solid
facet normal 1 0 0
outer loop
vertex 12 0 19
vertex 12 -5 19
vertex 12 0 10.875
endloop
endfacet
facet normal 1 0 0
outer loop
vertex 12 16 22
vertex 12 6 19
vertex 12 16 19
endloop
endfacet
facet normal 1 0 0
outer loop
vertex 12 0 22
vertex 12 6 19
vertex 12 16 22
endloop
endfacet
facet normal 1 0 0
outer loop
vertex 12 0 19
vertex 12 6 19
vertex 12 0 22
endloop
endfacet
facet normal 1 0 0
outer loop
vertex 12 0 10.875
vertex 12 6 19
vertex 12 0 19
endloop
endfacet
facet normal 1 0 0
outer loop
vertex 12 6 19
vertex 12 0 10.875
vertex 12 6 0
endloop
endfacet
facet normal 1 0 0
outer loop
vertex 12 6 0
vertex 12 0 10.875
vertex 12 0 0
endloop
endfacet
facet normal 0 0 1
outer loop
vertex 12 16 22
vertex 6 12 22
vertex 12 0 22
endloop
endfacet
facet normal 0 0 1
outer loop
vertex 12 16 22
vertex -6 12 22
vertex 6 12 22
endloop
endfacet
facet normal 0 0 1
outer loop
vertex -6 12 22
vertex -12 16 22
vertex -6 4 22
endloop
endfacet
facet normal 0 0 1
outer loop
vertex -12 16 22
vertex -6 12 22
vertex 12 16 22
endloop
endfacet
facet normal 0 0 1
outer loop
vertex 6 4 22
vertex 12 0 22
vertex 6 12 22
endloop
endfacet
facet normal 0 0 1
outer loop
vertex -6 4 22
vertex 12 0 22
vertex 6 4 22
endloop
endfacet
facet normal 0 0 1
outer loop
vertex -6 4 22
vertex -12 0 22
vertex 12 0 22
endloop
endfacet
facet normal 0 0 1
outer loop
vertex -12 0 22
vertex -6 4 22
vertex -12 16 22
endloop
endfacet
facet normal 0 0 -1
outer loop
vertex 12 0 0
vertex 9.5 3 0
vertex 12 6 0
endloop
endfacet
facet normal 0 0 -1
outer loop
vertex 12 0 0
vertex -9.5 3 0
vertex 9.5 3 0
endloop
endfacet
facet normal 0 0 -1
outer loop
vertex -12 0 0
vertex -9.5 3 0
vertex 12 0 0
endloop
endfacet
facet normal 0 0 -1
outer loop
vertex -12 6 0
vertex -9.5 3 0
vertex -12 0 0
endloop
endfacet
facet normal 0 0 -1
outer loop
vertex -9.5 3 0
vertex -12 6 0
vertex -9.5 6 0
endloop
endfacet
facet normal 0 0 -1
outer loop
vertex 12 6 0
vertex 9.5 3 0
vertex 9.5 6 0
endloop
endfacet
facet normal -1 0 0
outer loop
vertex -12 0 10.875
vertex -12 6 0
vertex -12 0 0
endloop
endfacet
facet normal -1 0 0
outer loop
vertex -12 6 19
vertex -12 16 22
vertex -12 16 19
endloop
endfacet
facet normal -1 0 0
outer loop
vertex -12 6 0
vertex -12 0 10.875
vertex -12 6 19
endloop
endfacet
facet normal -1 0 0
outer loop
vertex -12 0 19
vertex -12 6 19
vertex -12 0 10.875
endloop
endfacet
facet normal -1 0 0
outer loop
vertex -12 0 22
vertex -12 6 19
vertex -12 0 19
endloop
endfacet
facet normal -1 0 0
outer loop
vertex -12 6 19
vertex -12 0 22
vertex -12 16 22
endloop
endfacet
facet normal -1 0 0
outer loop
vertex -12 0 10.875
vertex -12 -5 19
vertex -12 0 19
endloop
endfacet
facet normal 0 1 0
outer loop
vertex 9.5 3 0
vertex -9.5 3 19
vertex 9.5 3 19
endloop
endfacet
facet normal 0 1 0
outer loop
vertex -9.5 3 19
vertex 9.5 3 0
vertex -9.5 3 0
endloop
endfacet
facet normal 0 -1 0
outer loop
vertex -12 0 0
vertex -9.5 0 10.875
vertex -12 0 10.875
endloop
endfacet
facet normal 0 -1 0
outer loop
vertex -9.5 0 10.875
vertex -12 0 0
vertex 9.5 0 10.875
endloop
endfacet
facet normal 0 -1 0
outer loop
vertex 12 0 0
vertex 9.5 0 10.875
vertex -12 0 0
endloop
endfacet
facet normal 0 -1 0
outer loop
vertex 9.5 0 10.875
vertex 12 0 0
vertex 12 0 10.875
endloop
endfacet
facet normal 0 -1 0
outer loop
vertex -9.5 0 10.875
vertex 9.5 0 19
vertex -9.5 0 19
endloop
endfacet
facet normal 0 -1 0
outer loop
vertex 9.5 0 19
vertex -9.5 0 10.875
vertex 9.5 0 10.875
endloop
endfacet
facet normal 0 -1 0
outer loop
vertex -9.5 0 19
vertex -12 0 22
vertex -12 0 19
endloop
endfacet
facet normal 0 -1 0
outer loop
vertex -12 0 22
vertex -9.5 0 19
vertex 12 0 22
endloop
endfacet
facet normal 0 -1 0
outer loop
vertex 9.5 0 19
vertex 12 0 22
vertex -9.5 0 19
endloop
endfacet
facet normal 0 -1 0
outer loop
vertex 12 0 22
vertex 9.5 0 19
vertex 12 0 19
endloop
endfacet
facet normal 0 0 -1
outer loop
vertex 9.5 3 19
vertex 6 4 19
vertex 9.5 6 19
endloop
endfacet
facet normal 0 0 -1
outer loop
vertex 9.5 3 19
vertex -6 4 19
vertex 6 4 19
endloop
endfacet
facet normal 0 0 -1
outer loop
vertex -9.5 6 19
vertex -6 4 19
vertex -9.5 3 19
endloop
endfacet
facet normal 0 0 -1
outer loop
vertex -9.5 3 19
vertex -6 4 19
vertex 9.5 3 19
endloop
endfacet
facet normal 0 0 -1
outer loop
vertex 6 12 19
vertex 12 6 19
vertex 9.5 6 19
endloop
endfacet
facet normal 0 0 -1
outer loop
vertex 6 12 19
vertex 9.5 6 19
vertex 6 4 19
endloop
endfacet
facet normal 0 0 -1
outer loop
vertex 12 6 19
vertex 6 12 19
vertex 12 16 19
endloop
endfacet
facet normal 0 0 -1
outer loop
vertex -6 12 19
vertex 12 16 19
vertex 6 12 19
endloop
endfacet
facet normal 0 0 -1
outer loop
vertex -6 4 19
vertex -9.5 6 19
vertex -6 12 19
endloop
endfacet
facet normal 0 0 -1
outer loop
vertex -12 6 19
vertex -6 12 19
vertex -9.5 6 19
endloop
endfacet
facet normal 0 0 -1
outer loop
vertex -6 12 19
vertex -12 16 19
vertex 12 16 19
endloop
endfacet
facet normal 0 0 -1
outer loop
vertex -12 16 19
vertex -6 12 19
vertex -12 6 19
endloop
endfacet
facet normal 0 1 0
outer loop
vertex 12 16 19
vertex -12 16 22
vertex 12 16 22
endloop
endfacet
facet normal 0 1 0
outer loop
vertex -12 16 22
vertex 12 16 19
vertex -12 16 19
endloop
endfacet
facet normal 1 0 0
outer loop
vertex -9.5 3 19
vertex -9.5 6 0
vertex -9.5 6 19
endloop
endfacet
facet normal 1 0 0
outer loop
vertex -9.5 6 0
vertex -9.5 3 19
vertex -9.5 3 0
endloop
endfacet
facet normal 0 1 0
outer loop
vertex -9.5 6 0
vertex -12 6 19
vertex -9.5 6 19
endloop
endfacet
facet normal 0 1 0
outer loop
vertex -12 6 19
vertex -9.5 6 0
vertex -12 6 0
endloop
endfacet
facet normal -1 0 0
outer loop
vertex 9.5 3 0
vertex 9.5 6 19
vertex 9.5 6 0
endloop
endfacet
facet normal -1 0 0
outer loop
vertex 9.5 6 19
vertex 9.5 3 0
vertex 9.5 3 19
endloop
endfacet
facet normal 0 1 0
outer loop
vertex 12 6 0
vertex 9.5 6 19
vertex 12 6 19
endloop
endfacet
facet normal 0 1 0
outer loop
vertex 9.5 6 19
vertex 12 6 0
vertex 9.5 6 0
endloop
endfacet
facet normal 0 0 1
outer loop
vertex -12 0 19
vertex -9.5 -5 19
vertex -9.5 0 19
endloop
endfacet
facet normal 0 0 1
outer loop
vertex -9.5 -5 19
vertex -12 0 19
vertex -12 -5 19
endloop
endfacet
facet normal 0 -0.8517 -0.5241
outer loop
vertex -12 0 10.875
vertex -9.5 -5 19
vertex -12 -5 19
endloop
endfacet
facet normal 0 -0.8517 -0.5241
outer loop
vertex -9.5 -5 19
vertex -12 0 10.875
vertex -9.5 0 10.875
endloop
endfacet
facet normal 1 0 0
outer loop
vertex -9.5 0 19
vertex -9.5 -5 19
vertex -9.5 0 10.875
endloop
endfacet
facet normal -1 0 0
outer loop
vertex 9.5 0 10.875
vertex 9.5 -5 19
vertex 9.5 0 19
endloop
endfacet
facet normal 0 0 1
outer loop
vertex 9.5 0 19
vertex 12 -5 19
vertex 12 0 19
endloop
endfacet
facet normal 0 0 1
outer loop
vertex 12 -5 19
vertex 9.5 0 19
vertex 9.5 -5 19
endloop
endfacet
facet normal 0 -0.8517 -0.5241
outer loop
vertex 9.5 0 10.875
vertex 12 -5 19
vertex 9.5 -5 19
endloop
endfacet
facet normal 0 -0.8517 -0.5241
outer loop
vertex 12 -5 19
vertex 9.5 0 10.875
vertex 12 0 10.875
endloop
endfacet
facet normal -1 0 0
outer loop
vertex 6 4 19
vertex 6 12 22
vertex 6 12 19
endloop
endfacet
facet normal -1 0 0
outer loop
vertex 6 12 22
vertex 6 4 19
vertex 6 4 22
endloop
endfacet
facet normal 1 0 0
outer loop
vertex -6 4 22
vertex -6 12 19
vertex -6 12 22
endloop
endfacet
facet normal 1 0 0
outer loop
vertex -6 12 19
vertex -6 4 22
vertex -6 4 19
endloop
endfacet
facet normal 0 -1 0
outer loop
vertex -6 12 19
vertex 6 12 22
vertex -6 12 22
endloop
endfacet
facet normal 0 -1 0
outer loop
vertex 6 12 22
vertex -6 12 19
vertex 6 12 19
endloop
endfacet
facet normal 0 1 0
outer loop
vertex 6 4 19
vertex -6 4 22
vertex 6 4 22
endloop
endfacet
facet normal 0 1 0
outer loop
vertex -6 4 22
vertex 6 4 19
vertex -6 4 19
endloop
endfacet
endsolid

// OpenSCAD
// USB-C base bracket for V_2_Daniel_Weber_Stand
// Holds a panel-mount USB-C female jack in the open bottom-center of the stand.
// Edit the numbers, then render (F6) and export STL.  Identical defaults to
// tools/make_base_bracket.py -- use whichever you prefer.
//
// Orientation when installed: +Z points to the REAR (the jack faces out the open
// back of the base); the FRONT face (Z=0) butts the solid front bezel so plugging
// a cable in can't push the bracket inward. Print with the FLOOR on the bed.

/* ---- tune to YOUR jack (mm) ---- */
pocket_depth = 22.0;  // front-to-back; keep == stand pocket depth so it wedges
width        = 24.0;
height       = 16.0;
floor_t      = 3.0;
panel_t      = 3.0;

aper_w   = 12.0;      // jack aperture width  (jack body + ~0.5 mm)
aper_h   = 8.0;       // jack aperture height
aper_yc  = 8.0;       // aperture center above the floor

screw_holes   = false; // set true if your jack mounts with 2 screws
screw_spacing = 16.0;  // center-to-center
screw_dia     = 2.2;   // M2 clearance

rail_t = 2.5; rail_h = 6.0;      // side rails
gusset_l = 8.0; gusset_h = 13.0; // panel-to-floor braces
$fn = 32;

module gusset(cx)
  // right-triangle brace on the panel front face, spanning rail width at x=cx
  translate([cx - rail_t/2, floor_t, pocket_depth - panel_t])
    rotate([0,90,0])
      linear_extrude(rail_t)
        polygon([[0,0],[0,-gusset_l],[gusset_h,0]]);

difference() {
  union() {
    // floor (rests on the stand's internal shelf)
    translate([-width/2, 0, 0]) cube([width, floor_t, pocket_depth]);
    // rear panel (solid; aperture cut below)
    translate([-width/2, 0, pocket_depth - panel_t]) cube([width, height, panel_t]);
    // side rails
    translate([-width/2, 0, 0]) cube([rail_t, rail_h, pocket_depth]);
    translate([ width/2 - rail_t, 0, 0]) cube([rail_t, rail_h, pocket_depth]);
    // gussets at the outer edges (clear of the central jack body)
    gusset(-width/2 + rail_t/2);
    gusset( width/2 - rail_t/2);
  }
  // jack aperture through the rear panel
  translate([-aper_w/2, aper_yc - aper_h/2, pocket_depth - panel_t - 0.5])
    cube([aper_w, aper_h, panel_t + 1.0]);
  // optional screw holes
  if (screw_holes)
    for (sx = [-screw_spacing/2, screw_spacing/2])
      translate([sx, aper_yc, pocket_depth - panel_t - 0.5])
        cylinder(d = screw_dia, h = panel_t + 1.0);
}
